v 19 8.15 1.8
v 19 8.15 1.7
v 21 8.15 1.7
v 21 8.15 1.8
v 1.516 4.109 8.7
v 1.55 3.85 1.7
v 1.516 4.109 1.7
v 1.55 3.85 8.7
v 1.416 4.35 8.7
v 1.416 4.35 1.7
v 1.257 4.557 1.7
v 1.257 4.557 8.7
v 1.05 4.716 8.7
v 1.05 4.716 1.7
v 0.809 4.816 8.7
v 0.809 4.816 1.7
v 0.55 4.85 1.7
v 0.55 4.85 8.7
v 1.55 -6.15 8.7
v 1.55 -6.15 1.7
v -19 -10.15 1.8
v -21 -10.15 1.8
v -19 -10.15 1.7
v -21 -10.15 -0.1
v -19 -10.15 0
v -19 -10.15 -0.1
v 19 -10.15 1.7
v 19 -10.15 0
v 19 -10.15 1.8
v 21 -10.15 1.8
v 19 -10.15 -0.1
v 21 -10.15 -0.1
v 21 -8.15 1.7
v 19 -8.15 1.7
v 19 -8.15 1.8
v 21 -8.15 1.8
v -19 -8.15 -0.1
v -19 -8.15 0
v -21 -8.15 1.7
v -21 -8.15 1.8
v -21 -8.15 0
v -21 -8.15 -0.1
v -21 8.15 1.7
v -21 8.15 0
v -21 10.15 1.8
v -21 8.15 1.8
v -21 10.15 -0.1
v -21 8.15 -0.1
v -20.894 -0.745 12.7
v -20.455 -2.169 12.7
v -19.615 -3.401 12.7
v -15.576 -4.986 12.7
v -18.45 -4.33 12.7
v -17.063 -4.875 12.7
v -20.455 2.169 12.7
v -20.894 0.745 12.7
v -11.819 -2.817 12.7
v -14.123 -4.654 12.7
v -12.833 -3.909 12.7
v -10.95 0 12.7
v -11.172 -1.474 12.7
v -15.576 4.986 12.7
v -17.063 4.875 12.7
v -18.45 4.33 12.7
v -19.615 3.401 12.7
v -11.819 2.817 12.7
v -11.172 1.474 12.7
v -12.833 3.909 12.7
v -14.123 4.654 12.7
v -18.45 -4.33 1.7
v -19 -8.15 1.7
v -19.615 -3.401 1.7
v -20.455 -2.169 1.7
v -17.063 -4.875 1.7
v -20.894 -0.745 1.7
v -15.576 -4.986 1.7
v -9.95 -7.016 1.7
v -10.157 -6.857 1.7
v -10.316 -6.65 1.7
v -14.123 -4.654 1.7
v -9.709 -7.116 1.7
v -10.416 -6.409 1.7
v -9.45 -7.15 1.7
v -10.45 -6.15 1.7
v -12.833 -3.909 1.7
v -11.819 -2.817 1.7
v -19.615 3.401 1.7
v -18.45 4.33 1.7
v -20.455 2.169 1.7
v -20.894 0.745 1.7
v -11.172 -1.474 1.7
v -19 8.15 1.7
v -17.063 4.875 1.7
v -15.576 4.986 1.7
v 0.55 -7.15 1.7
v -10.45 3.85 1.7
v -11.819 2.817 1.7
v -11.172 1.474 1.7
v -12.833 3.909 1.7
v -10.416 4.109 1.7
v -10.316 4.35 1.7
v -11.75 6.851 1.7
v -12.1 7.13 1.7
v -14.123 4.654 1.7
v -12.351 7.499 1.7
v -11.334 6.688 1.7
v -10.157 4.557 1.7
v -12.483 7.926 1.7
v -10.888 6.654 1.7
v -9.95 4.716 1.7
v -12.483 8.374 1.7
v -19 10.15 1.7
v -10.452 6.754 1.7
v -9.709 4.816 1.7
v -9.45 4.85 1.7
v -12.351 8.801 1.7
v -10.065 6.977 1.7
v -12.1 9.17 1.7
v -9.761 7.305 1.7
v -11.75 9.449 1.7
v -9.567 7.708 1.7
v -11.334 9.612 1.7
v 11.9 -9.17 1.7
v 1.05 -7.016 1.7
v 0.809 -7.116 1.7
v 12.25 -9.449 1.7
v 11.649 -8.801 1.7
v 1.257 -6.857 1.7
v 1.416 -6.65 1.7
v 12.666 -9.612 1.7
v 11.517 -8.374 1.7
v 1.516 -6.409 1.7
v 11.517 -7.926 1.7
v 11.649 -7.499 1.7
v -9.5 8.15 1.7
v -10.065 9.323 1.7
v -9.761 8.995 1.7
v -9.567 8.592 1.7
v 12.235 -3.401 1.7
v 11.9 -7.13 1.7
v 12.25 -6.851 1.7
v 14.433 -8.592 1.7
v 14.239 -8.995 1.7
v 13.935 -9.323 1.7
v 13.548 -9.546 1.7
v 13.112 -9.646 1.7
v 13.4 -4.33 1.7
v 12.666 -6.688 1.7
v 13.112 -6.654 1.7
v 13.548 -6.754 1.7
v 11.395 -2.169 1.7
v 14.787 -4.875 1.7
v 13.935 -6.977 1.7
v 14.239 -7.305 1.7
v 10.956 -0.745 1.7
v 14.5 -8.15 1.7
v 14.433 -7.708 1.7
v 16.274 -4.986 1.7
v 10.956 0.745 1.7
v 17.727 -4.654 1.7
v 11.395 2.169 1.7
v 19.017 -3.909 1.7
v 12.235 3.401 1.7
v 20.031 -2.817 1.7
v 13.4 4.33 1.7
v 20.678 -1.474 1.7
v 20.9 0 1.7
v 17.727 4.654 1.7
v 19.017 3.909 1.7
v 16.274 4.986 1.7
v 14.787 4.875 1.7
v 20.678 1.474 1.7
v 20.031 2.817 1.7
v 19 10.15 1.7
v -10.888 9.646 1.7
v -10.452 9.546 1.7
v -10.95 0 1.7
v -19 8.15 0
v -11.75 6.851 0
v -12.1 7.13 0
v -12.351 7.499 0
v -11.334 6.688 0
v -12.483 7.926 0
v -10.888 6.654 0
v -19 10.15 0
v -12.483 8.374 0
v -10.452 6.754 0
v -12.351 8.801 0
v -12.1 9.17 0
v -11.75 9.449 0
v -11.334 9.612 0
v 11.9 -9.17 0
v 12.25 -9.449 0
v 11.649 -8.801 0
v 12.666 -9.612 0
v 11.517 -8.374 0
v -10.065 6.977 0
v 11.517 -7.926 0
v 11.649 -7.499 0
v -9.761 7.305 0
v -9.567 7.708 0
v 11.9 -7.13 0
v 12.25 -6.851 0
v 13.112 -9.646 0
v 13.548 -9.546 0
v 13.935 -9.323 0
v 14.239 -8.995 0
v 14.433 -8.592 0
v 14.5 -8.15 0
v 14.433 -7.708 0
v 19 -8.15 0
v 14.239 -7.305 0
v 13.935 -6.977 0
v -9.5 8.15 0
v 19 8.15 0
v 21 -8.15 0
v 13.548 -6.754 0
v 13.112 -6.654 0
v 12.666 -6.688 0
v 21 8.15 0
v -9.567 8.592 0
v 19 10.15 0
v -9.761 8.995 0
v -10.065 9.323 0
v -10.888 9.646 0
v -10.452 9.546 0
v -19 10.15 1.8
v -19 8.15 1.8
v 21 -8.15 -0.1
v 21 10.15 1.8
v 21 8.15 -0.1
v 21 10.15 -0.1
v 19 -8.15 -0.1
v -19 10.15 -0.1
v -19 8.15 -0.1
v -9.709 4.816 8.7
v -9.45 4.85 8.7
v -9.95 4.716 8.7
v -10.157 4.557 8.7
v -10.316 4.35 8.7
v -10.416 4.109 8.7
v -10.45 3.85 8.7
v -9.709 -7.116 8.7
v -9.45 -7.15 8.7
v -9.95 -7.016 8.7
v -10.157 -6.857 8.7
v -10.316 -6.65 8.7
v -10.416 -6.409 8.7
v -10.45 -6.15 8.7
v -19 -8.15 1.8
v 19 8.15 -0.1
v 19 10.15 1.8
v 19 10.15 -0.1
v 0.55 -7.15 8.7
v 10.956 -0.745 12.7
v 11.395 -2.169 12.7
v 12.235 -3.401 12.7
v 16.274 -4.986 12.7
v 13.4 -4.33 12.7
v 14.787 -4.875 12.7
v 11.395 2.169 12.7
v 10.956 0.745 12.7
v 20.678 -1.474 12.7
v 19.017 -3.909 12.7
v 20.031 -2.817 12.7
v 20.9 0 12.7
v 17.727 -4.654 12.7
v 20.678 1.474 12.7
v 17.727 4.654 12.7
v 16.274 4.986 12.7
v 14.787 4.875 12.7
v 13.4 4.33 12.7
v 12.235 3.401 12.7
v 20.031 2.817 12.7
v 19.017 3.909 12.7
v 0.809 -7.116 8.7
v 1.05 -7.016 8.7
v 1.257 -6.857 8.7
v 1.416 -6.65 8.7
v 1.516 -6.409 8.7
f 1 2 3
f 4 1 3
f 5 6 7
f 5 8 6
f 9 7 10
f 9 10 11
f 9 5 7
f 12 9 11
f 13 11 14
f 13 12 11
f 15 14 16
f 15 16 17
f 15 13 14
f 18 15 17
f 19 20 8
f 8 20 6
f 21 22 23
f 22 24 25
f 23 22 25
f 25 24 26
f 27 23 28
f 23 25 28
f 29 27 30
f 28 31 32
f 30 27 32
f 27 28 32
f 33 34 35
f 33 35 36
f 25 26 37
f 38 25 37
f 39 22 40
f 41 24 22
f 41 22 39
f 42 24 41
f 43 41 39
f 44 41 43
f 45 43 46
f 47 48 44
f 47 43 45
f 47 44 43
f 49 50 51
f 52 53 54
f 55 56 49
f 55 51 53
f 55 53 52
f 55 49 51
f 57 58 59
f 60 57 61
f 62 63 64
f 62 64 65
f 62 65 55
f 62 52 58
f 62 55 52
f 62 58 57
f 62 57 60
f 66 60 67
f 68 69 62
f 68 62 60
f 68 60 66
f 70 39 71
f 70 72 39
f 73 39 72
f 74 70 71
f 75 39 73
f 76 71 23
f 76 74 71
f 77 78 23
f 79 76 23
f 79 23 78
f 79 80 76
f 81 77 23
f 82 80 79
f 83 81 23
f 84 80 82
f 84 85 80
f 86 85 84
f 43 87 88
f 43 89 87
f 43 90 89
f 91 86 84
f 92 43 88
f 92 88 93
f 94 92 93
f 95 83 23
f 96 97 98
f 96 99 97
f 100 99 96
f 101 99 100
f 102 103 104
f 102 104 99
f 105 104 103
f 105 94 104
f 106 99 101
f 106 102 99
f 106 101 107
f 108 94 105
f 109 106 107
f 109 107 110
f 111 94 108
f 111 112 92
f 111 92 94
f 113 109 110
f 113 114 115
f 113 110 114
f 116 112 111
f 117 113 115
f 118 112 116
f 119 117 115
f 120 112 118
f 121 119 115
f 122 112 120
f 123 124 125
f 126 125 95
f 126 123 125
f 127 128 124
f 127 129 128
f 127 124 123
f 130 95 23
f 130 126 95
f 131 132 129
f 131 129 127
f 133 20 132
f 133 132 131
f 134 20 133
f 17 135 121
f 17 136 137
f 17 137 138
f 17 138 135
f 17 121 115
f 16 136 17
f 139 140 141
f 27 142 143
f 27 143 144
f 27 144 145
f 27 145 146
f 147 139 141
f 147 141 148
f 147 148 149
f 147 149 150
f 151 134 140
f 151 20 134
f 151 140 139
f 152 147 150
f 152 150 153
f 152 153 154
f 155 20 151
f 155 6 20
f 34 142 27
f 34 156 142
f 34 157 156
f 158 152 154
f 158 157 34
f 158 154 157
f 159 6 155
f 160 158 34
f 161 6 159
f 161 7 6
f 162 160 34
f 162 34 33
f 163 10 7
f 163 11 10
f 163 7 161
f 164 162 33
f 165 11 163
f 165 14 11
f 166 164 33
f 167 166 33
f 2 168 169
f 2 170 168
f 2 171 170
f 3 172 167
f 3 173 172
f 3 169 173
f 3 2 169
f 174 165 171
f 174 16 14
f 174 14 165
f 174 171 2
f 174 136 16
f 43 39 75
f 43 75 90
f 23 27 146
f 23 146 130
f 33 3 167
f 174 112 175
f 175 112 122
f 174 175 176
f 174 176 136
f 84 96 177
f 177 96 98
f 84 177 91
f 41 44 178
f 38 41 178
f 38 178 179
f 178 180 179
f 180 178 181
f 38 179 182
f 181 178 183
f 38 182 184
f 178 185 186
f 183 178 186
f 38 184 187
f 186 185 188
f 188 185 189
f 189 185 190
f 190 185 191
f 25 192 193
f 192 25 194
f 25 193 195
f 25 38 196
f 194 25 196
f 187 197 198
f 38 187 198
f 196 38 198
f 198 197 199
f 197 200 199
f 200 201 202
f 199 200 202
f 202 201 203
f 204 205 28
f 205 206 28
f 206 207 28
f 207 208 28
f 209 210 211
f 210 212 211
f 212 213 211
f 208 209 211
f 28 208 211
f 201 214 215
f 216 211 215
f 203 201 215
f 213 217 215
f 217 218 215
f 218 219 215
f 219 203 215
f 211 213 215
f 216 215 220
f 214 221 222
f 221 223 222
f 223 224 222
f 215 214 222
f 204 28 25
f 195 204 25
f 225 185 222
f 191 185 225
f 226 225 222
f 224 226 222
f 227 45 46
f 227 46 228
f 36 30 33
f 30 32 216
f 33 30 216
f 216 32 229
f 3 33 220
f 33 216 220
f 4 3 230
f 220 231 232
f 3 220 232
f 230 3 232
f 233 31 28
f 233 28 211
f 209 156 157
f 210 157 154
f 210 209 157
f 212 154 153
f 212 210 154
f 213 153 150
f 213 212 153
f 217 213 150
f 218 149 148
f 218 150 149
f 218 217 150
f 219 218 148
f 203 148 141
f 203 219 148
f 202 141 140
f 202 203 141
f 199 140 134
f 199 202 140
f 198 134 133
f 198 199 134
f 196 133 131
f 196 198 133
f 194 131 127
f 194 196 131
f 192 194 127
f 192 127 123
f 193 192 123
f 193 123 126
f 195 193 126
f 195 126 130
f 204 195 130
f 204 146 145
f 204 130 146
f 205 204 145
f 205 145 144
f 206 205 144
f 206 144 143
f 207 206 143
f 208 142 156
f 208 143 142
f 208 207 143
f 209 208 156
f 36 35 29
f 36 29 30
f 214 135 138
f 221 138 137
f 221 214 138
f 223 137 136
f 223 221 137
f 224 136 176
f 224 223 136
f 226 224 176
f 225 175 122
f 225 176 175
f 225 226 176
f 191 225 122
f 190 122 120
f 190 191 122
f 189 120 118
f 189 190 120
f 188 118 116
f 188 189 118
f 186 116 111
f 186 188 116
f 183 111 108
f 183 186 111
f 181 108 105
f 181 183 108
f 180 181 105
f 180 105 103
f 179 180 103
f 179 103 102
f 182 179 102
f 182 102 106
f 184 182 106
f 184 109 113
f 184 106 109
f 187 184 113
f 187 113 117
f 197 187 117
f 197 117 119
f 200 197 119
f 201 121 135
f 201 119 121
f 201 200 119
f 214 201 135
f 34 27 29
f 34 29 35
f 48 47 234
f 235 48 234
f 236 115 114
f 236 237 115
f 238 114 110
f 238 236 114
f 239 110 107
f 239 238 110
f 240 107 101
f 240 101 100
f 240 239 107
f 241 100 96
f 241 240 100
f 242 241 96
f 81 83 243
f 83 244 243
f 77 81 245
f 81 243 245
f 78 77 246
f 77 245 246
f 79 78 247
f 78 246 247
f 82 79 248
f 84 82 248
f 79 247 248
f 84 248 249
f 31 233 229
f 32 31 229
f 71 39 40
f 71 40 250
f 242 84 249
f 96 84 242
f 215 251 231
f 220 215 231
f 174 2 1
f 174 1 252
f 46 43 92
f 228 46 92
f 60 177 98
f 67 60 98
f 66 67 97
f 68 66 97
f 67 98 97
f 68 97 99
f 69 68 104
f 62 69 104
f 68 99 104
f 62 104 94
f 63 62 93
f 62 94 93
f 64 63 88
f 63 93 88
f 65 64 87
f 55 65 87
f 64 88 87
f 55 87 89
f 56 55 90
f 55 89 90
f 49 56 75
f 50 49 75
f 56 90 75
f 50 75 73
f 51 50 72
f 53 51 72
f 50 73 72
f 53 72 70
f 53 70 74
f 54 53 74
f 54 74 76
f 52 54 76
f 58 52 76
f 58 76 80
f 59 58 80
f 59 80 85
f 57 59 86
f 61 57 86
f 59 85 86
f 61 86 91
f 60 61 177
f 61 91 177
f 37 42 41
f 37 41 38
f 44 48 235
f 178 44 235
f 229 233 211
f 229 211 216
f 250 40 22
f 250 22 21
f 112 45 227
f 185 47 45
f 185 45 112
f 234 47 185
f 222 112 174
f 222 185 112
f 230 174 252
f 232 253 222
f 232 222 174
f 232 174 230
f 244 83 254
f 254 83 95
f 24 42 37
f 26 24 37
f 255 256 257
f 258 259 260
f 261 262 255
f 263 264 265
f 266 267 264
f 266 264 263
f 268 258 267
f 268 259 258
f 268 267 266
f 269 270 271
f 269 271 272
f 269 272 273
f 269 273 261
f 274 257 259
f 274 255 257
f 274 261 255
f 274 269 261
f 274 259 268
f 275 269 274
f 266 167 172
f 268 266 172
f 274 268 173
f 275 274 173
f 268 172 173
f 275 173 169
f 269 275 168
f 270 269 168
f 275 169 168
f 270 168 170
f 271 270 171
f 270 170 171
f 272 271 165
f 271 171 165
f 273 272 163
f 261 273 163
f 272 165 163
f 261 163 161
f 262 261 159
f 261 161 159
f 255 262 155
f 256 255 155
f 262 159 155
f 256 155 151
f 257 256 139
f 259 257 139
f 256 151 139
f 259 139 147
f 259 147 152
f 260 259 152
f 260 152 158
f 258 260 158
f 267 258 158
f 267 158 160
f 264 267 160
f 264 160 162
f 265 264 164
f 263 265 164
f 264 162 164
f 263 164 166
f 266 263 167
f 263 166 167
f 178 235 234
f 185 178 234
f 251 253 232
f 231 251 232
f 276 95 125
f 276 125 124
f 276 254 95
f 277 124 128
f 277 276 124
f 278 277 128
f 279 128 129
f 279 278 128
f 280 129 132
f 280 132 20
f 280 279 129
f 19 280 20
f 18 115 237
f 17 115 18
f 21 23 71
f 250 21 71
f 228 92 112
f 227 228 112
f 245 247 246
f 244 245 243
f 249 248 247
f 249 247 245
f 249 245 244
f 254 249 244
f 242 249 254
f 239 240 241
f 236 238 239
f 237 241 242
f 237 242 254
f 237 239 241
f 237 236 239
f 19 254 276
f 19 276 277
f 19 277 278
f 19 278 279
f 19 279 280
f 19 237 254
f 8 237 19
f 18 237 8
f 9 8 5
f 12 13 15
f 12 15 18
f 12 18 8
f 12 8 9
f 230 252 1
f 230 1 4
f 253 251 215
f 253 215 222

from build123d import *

# Parameters (mm, degrees)
SKETCH1_W           = 42
SKETCH1_H           = 20.3
BOSS_EXTRUDE1_DEPTH = 1.7
BOSS_EXTRUDE2_START = 1.7
SKETCH1_3_R         = 5
BOSS_EXTRUDE2_DEPTH = 11
BOSS_EXTRUDE3_START = 1.7
SKETCH1_4_W         = 12
SKETCH1_4_H         = 12
BOSS_EXTRUDE3_DEPTH = 7
FILLET1_R           = 1
SKETCH1_5_R         = 1.5
CUT_EXTRUDE1_DEPTH  = 27.557720158
BOSS_EXTRUDE4_START = -0.1
SKETCH1_6_W         = 2
SKETCH1_6_H         = 2
BOSS_EXTRUDE4_DEPTH = 1.9


with BuildPart() as part:
    # Sketch1 → Boss-Extrude1 (new body)
    with BuildSketch(Plane.XY):
        Rectangle(SKETCH1_W, SKETCH1_H)
    extrude(amount=BOSS_EXTRUDE1_DEPTH)

    # Sketch1<3> → Boss-Extrude2 (add)
    with BuildSketch(Plane.XY.offset(BOSS_EXTRUDE2_START)):
        with Locations((-15.95, 0)):
            Circle(SKETCH1_3_R)
        with Locations((15.9, 0)):
            Circle(SKETCH1_3_R)
    extrude(amount=BOSS_EXTRUDE2_DEPTH)

    # Sketch1<4> → Boss-Extrude3 (add)
    with BuildSketch(Plane.XY.offset(BOSS_EXTRUDE3_START)):
        with Locations((-4.45, -1.15)):
            Rectangle(SKETCH1_4_W, SKETCH1_4_H)
    extrude(amount=BOSS_EXTRUDE3_DEPTH)

    # Fillet1
    fillet1_edges = [part.edges().sort_by_distance(p)[0] for p in [
        (-10.45, 4.85, 5.2),
        (-10.45, -7.15, 5.2),
        (1.55, -7.15, 5.2),
        (1.55, 4.85, 5.2),
    ]]
    fillet(fillet1_edges, radius=FILLET1_R)

    # Sketch1<5> → Cut-Extrude1 (cut, through all)
    with BuildSketch(Plane.XY):
        with Locations((-11, 8.15)):
            Circle(SKETCH1_5_R)
        with Locations((13, -8.15)):
            Circle(SKETCH1_5_R)
    extrude(amount=CUT_EXTRUDE1_DEPTH, mode=Mode.SUBTRACT)

    # Sketch1<6> → Boss-Extrude4 (add)
    with BuildSketch(Plane.XY.offset(BOSS_EXTRUDE4_START)):
        with Locations((20, 9.15)):
            Rectangle(SKETCH1_6_W, SKETCH1_6_H)
        with Locations((-20, 9.15)):
            Rectangle(SKETCH1_6_W, SKETCH1_6_H)
        with Locations((20, -9.15)):
            Rectangle(SKETCH1_6_W, SKETCH1_6_H)
        with Locations((-20, -9.15)):
            Rectangle(SKETCH1_6_W, SKETCH1_6_H)
    extrude(amount=BOSS_EXTRUDE4_DEPTH)


solid = part.part
